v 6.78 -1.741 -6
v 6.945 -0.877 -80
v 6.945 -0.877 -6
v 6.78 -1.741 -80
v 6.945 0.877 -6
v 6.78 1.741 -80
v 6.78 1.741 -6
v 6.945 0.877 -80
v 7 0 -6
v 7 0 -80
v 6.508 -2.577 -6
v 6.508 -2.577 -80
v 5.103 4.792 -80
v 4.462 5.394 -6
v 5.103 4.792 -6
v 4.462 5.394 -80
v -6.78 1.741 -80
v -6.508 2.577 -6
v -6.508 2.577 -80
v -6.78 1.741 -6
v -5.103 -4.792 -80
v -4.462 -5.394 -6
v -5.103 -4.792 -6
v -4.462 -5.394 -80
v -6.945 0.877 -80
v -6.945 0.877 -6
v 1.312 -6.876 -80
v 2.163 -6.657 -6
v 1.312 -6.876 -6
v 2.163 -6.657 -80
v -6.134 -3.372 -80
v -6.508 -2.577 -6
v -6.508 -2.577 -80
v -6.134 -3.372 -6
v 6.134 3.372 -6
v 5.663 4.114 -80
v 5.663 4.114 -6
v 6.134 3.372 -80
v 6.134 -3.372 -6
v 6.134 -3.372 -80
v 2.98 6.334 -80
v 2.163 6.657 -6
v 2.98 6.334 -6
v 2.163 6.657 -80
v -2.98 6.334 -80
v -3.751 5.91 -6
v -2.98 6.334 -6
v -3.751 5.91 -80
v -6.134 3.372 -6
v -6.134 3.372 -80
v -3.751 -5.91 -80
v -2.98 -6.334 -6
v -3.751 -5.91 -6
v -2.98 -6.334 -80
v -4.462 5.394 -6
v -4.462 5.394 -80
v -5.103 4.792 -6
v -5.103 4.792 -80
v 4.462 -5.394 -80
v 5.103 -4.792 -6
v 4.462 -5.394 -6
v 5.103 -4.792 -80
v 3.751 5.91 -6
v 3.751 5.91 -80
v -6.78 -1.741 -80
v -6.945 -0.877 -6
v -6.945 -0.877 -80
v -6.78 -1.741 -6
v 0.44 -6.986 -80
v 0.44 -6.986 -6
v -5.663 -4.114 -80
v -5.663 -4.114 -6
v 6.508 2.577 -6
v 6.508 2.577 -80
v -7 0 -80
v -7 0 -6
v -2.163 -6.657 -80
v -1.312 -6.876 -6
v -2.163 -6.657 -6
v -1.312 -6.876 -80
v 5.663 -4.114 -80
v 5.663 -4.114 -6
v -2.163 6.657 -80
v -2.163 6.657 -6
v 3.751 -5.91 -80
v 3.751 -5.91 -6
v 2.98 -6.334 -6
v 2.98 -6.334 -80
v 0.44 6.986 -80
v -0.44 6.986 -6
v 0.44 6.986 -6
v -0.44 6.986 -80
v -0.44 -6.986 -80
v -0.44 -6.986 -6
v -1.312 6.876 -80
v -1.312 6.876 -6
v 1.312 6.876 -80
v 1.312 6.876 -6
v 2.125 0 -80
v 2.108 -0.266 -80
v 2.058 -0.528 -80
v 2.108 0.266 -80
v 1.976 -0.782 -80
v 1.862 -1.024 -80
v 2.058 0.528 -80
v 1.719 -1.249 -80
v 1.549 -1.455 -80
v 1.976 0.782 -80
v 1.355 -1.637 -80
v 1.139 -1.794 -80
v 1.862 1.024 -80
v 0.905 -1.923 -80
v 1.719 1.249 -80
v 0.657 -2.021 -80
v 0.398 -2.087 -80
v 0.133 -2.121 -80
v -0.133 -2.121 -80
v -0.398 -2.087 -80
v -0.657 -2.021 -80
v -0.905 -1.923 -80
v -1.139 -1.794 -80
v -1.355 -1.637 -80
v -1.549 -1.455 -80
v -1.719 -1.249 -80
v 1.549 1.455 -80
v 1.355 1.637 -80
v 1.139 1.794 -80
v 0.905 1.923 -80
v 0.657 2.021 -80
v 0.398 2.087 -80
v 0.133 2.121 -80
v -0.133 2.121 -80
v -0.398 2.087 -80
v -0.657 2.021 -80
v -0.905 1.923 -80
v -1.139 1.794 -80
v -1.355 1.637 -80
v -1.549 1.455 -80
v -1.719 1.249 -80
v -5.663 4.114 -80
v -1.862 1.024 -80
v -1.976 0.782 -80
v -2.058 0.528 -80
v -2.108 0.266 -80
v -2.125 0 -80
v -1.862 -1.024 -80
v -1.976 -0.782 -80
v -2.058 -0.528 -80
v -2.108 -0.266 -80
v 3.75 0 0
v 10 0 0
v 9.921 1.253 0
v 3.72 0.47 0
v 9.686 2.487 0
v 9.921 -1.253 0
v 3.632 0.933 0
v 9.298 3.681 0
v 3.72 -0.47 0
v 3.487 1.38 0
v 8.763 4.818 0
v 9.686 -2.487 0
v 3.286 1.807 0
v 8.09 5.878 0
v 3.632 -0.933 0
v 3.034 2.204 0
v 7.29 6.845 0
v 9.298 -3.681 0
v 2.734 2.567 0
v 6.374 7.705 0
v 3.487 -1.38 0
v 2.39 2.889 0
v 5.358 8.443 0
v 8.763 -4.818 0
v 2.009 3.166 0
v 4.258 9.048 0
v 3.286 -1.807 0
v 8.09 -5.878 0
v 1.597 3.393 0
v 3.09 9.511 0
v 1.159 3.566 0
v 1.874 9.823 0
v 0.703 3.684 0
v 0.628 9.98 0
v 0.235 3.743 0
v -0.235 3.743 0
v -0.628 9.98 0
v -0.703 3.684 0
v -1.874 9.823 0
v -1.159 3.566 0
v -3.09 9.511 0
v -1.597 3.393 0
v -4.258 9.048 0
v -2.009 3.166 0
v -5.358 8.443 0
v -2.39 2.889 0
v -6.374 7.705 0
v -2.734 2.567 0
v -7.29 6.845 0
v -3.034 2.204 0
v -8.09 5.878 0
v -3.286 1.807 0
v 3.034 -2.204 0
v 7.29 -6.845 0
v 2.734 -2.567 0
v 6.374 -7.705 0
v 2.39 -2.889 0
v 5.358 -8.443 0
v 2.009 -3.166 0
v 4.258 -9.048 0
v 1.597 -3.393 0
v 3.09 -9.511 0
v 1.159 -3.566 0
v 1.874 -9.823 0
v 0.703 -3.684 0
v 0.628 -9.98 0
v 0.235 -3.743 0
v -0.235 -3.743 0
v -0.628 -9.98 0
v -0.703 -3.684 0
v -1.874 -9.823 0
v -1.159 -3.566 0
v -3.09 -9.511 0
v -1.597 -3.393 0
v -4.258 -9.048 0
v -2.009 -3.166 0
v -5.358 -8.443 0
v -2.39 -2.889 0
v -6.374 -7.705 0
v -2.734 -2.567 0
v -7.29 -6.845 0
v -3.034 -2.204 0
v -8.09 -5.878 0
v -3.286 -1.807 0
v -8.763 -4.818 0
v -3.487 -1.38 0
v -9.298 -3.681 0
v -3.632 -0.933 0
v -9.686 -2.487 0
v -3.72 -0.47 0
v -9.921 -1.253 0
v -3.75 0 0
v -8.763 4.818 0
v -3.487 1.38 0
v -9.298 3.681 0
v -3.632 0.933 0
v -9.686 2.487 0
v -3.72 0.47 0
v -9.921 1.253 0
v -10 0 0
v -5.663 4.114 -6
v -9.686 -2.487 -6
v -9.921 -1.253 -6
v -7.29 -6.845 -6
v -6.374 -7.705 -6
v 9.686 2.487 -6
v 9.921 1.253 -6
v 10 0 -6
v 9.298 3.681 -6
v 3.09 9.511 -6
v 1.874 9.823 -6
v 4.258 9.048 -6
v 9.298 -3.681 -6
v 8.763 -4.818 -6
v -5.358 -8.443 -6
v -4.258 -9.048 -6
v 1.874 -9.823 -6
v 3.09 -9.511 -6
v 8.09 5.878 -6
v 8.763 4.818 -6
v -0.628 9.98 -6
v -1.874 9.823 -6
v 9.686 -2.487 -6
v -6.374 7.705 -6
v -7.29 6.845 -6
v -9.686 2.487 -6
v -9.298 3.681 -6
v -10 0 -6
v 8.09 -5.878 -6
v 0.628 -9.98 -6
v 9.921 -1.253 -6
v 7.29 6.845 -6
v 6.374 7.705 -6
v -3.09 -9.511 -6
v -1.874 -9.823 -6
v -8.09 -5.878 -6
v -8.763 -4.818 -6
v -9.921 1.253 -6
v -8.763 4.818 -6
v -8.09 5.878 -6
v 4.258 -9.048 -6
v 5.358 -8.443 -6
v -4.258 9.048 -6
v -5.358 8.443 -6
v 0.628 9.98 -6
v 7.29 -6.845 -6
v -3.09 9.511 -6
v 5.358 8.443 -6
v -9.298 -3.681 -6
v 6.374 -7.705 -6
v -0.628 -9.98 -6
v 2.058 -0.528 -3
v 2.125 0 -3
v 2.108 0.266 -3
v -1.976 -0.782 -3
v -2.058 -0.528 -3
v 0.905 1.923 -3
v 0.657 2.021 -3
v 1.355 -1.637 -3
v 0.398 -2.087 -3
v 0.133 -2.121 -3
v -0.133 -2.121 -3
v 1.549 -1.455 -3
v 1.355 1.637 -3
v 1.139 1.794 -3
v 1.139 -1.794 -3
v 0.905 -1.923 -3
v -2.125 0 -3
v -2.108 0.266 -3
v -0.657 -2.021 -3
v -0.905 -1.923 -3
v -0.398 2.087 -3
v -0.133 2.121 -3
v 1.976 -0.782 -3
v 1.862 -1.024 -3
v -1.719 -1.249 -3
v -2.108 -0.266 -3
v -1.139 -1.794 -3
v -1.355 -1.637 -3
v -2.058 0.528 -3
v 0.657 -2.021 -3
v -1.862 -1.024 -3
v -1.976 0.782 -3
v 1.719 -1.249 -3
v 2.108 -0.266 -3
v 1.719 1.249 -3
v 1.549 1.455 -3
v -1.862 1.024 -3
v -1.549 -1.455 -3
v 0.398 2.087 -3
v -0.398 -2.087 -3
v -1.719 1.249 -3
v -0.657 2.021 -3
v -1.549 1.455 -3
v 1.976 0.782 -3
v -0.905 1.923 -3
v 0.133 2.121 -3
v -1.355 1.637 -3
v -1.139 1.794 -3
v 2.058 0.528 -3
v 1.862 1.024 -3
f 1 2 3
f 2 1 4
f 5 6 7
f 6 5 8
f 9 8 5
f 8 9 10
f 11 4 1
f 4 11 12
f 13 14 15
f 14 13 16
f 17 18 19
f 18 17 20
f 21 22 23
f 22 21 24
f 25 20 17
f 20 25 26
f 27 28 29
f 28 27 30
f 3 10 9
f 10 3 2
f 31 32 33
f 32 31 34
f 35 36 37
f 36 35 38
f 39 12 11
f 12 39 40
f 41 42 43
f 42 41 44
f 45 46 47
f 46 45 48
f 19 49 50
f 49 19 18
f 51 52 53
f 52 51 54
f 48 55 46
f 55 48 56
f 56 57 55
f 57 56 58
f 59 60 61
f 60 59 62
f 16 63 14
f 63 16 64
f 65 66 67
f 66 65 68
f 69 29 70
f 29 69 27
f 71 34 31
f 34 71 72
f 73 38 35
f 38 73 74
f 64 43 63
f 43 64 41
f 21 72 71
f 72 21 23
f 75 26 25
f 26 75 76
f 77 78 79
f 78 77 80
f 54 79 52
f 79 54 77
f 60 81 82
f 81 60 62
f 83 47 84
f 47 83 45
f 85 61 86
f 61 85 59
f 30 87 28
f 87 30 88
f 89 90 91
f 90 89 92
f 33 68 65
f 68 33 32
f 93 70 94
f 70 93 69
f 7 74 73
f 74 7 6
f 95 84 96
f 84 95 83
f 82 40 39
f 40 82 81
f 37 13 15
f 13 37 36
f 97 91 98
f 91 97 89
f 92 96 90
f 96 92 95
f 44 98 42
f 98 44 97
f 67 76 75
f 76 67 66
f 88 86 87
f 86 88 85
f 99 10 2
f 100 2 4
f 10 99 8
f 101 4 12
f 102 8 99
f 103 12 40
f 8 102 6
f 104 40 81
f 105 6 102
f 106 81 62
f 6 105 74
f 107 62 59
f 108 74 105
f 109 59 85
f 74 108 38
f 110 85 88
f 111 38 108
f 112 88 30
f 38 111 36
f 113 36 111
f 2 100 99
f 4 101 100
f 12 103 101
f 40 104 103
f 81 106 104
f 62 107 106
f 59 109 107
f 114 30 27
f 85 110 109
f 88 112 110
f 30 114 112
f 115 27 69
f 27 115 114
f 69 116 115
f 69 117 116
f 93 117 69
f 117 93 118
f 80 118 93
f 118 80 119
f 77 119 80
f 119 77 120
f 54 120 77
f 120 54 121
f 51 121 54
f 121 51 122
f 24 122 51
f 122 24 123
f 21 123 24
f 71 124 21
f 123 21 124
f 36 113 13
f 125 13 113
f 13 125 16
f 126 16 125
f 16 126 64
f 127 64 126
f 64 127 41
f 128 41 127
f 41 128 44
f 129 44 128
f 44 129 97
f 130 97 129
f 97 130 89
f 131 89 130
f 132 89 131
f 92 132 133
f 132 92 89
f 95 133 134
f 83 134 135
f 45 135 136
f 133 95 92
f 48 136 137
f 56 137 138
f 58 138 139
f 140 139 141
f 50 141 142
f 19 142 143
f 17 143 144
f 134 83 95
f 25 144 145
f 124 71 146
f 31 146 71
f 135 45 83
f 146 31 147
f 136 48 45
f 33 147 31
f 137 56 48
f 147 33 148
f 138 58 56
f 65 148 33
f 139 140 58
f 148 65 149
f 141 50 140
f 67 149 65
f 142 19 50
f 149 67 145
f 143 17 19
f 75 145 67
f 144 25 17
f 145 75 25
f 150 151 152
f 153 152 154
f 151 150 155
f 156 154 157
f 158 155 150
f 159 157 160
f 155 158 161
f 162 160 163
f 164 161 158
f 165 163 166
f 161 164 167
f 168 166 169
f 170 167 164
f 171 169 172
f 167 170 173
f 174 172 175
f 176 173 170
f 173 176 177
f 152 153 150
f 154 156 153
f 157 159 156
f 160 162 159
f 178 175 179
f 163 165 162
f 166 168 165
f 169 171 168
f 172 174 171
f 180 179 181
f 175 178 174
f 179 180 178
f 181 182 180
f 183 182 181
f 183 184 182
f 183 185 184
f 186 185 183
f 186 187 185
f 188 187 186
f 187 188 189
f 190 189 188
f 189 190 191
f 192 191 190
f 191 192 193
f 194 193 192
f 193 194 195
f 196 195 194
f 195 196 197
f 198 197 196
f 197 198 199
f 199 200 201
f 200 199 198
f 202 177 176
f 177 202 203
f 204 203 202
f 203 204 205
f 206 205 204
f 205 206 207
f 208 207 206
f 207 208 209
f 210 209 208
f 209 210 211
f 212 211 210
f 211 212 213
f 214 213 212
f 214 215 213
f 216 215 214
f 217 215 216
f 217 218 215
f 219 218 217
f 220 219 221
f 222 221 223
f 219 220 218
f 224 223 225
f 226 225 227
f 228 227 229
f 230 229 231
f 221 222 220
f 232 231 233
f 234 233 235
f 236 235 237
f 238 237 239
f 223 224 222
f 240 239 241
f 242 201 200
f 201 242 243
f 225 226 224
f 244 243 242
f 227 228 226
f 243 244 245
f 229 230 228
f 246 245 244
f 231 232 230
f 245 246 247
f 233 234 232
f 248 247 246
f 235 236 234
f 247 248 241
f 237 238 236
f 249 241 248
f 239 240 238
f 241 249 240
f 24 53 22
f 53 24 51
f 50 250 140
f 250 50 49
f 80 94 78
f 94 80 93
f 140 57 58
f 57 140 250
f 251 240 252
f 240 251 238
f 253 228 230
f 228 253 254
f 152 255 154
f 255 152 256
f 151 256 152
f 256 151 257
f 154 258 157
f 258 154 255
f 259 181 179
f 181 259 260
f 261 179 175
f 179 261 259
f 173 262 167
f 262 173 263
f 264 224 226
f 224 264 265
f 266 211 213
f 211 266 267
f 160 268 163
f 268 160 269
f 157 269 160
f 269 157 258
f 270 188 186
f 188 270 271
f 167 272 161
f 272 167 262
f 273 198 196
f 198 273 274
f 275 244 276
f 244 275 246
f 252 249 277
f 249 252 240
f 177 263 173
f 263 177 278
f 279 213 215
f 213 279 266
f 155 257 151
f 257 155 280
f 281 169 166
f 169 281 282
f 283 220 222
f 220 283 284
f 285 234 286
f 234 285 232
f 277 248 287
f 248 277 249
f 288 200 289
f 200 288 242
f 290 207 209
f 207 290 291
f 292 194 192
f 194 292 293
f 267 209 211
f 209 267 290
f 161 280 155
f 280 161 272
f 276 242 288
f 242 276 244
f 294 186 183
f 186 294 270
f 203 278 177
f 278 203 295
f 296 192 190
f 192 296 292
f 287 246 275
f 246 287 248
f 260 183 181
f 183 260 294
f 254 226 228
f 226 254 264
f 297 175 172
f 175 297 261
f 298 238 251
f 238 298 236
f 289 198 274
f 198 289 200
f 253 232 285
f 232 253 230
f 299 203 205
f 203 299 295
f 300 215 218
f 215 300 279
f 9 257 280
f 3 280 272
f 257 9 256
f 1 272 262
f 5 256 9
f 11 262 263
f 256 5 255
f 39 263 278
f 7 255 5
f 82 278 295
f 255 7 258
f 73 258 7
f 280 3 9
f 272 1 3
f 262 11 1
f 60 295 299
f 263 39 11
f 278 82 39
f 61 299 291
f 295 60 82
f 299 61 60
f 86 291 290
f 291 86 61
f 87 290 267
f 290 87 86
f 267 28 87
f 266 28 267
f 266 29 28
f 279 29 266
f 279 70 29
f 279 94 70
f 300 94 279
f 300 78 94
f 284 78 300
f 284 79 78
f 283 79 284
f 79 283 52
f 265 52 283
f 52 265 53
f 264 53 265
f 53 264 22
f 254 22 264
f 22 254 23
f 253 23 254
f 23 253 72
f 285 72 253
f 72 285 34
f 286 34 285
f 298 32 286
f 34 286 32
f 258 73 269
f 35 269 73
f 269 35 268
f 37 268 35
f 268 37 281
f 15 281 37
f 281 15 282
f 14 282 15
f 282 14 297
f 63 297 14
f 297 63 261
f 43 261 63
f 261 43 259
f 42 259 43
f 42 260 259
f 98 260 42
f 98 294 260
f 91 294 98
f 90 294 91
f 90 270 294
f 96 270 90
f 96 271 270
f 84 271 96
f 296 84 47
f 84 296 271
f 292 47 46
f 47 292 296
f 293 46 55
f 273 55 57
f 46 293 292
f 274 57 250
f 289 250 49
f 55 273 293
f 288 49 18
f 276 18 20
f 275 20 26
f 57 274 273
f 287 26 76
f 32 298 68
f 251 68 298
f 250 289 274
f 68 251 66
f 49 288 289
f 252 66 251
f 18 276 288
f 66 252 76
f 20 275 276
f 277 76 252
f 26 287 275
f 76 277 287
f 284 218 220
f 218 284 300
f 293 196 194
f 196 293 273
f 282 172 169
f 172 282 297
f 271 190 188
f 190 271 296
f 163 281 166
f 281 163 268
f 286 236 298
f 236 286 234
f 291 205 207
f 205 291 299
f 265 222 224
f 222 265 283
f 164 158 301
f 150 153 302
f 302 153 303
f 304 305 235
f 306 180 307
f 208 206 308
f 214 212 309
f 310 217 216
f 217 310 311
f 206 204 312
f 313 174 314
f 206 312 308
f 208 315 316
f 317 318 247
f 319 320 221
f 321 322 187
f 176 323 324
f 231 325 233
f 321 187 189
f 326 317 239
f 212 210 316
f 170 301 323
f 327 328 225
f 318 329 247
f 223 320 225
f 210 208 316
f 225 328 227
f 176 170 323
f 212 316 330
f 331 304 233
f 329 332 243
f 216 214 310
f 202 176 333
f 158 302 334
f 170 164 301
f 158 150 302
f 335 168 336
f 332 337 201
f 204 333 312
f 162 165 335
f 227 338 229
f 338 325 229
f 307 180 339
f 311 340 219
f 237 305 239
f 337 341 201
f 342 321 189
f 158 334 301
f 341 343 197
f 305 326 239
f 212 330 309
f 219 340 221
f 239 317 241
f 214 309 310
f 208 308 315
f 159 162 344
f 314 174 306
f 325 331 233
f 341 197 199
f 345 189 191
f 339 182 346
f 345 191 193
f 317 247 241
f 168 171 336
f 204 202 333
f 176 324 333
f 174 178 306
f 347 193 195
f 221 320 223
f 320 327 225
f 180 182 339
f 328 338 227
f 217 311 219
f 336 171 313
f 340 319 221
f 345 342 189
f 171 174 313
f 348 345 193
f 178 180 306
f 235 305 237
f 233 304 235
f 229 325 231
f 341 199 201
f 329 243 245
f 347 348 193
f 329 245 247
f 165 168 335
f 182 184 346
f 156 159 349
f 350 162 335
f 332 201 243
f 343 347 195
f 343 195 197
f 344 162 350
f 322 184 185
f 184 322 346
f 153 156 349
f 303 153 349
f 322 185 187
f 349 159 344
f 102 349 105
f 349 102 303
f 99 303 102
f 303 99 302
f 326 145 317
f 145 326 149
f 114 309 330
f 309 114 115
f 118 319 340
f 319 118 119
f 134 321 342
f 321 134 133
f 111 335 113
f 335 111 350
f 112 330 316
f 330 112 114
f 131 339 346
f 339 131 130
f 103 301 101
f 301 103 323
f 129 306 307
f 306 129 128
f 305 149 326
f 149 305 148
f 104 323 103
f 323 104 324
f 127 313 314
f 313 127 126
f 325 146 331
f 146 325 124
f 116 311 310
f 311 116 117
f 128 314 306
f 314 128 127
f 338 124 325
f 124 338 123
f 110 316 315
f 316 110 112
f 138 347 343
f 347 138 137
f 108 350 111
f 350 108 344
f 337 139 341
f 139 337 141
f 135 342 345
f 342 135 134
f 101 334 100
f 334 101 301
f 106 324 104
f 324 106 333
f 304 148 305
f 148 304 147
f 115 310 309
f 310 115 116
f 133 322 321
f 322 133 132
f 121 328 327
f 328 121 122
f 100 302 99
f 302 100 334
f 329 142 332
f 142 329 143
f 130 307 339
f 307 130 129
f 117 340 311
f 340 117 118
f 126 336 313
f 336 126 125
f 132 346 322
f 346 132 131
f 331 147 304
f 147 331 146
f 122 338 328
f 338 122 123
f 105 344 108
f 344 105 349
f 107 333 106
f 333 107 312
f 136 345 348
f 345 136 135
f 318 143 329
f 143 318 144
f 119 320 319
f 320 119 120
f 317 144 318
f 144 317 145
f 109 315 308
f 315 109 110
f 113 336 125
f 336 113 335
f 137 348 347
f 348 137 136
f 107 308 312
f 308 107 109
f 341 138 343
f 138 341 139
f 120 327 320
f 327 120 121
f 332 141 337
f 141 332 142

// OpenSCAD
$fn = 50;


difference() {
	union() {
		translate(v = [0, 0, -80.0000000000]) {
			cylinder(h = 80, r = 7.0000000000);
		}
		translate(v = [0, 0, -6.0000000000]) {
			cylinder(h = 6, r = 10.0000000000);
		}
	}
	union() {
		translate(v = [0, 0, 0]) {
			rotate(a = [0, 0, 0]) {
				difference() {
					union() {
						#translate(v = [0, 0, -80.0000000000]) {
							cylinder(h = 80, r = 2.0000000000);
						}
						#translate(v = [0, 0, -3]) {
							cylinder(h = 3, r1 = 2.1250000000, r2 = 3.7500000000);
						}
						#translate(v = [0, 0, -80.0000000000]) {
							cylinder(h = 80, r = 2.1250000000);
						}
						#translate(v = [0, 0, -80.0000000000]) {
							cylinder(h = 80, r = 2.0000000000);
						}
					}
					union();
				}
			}
		}
	}
}
